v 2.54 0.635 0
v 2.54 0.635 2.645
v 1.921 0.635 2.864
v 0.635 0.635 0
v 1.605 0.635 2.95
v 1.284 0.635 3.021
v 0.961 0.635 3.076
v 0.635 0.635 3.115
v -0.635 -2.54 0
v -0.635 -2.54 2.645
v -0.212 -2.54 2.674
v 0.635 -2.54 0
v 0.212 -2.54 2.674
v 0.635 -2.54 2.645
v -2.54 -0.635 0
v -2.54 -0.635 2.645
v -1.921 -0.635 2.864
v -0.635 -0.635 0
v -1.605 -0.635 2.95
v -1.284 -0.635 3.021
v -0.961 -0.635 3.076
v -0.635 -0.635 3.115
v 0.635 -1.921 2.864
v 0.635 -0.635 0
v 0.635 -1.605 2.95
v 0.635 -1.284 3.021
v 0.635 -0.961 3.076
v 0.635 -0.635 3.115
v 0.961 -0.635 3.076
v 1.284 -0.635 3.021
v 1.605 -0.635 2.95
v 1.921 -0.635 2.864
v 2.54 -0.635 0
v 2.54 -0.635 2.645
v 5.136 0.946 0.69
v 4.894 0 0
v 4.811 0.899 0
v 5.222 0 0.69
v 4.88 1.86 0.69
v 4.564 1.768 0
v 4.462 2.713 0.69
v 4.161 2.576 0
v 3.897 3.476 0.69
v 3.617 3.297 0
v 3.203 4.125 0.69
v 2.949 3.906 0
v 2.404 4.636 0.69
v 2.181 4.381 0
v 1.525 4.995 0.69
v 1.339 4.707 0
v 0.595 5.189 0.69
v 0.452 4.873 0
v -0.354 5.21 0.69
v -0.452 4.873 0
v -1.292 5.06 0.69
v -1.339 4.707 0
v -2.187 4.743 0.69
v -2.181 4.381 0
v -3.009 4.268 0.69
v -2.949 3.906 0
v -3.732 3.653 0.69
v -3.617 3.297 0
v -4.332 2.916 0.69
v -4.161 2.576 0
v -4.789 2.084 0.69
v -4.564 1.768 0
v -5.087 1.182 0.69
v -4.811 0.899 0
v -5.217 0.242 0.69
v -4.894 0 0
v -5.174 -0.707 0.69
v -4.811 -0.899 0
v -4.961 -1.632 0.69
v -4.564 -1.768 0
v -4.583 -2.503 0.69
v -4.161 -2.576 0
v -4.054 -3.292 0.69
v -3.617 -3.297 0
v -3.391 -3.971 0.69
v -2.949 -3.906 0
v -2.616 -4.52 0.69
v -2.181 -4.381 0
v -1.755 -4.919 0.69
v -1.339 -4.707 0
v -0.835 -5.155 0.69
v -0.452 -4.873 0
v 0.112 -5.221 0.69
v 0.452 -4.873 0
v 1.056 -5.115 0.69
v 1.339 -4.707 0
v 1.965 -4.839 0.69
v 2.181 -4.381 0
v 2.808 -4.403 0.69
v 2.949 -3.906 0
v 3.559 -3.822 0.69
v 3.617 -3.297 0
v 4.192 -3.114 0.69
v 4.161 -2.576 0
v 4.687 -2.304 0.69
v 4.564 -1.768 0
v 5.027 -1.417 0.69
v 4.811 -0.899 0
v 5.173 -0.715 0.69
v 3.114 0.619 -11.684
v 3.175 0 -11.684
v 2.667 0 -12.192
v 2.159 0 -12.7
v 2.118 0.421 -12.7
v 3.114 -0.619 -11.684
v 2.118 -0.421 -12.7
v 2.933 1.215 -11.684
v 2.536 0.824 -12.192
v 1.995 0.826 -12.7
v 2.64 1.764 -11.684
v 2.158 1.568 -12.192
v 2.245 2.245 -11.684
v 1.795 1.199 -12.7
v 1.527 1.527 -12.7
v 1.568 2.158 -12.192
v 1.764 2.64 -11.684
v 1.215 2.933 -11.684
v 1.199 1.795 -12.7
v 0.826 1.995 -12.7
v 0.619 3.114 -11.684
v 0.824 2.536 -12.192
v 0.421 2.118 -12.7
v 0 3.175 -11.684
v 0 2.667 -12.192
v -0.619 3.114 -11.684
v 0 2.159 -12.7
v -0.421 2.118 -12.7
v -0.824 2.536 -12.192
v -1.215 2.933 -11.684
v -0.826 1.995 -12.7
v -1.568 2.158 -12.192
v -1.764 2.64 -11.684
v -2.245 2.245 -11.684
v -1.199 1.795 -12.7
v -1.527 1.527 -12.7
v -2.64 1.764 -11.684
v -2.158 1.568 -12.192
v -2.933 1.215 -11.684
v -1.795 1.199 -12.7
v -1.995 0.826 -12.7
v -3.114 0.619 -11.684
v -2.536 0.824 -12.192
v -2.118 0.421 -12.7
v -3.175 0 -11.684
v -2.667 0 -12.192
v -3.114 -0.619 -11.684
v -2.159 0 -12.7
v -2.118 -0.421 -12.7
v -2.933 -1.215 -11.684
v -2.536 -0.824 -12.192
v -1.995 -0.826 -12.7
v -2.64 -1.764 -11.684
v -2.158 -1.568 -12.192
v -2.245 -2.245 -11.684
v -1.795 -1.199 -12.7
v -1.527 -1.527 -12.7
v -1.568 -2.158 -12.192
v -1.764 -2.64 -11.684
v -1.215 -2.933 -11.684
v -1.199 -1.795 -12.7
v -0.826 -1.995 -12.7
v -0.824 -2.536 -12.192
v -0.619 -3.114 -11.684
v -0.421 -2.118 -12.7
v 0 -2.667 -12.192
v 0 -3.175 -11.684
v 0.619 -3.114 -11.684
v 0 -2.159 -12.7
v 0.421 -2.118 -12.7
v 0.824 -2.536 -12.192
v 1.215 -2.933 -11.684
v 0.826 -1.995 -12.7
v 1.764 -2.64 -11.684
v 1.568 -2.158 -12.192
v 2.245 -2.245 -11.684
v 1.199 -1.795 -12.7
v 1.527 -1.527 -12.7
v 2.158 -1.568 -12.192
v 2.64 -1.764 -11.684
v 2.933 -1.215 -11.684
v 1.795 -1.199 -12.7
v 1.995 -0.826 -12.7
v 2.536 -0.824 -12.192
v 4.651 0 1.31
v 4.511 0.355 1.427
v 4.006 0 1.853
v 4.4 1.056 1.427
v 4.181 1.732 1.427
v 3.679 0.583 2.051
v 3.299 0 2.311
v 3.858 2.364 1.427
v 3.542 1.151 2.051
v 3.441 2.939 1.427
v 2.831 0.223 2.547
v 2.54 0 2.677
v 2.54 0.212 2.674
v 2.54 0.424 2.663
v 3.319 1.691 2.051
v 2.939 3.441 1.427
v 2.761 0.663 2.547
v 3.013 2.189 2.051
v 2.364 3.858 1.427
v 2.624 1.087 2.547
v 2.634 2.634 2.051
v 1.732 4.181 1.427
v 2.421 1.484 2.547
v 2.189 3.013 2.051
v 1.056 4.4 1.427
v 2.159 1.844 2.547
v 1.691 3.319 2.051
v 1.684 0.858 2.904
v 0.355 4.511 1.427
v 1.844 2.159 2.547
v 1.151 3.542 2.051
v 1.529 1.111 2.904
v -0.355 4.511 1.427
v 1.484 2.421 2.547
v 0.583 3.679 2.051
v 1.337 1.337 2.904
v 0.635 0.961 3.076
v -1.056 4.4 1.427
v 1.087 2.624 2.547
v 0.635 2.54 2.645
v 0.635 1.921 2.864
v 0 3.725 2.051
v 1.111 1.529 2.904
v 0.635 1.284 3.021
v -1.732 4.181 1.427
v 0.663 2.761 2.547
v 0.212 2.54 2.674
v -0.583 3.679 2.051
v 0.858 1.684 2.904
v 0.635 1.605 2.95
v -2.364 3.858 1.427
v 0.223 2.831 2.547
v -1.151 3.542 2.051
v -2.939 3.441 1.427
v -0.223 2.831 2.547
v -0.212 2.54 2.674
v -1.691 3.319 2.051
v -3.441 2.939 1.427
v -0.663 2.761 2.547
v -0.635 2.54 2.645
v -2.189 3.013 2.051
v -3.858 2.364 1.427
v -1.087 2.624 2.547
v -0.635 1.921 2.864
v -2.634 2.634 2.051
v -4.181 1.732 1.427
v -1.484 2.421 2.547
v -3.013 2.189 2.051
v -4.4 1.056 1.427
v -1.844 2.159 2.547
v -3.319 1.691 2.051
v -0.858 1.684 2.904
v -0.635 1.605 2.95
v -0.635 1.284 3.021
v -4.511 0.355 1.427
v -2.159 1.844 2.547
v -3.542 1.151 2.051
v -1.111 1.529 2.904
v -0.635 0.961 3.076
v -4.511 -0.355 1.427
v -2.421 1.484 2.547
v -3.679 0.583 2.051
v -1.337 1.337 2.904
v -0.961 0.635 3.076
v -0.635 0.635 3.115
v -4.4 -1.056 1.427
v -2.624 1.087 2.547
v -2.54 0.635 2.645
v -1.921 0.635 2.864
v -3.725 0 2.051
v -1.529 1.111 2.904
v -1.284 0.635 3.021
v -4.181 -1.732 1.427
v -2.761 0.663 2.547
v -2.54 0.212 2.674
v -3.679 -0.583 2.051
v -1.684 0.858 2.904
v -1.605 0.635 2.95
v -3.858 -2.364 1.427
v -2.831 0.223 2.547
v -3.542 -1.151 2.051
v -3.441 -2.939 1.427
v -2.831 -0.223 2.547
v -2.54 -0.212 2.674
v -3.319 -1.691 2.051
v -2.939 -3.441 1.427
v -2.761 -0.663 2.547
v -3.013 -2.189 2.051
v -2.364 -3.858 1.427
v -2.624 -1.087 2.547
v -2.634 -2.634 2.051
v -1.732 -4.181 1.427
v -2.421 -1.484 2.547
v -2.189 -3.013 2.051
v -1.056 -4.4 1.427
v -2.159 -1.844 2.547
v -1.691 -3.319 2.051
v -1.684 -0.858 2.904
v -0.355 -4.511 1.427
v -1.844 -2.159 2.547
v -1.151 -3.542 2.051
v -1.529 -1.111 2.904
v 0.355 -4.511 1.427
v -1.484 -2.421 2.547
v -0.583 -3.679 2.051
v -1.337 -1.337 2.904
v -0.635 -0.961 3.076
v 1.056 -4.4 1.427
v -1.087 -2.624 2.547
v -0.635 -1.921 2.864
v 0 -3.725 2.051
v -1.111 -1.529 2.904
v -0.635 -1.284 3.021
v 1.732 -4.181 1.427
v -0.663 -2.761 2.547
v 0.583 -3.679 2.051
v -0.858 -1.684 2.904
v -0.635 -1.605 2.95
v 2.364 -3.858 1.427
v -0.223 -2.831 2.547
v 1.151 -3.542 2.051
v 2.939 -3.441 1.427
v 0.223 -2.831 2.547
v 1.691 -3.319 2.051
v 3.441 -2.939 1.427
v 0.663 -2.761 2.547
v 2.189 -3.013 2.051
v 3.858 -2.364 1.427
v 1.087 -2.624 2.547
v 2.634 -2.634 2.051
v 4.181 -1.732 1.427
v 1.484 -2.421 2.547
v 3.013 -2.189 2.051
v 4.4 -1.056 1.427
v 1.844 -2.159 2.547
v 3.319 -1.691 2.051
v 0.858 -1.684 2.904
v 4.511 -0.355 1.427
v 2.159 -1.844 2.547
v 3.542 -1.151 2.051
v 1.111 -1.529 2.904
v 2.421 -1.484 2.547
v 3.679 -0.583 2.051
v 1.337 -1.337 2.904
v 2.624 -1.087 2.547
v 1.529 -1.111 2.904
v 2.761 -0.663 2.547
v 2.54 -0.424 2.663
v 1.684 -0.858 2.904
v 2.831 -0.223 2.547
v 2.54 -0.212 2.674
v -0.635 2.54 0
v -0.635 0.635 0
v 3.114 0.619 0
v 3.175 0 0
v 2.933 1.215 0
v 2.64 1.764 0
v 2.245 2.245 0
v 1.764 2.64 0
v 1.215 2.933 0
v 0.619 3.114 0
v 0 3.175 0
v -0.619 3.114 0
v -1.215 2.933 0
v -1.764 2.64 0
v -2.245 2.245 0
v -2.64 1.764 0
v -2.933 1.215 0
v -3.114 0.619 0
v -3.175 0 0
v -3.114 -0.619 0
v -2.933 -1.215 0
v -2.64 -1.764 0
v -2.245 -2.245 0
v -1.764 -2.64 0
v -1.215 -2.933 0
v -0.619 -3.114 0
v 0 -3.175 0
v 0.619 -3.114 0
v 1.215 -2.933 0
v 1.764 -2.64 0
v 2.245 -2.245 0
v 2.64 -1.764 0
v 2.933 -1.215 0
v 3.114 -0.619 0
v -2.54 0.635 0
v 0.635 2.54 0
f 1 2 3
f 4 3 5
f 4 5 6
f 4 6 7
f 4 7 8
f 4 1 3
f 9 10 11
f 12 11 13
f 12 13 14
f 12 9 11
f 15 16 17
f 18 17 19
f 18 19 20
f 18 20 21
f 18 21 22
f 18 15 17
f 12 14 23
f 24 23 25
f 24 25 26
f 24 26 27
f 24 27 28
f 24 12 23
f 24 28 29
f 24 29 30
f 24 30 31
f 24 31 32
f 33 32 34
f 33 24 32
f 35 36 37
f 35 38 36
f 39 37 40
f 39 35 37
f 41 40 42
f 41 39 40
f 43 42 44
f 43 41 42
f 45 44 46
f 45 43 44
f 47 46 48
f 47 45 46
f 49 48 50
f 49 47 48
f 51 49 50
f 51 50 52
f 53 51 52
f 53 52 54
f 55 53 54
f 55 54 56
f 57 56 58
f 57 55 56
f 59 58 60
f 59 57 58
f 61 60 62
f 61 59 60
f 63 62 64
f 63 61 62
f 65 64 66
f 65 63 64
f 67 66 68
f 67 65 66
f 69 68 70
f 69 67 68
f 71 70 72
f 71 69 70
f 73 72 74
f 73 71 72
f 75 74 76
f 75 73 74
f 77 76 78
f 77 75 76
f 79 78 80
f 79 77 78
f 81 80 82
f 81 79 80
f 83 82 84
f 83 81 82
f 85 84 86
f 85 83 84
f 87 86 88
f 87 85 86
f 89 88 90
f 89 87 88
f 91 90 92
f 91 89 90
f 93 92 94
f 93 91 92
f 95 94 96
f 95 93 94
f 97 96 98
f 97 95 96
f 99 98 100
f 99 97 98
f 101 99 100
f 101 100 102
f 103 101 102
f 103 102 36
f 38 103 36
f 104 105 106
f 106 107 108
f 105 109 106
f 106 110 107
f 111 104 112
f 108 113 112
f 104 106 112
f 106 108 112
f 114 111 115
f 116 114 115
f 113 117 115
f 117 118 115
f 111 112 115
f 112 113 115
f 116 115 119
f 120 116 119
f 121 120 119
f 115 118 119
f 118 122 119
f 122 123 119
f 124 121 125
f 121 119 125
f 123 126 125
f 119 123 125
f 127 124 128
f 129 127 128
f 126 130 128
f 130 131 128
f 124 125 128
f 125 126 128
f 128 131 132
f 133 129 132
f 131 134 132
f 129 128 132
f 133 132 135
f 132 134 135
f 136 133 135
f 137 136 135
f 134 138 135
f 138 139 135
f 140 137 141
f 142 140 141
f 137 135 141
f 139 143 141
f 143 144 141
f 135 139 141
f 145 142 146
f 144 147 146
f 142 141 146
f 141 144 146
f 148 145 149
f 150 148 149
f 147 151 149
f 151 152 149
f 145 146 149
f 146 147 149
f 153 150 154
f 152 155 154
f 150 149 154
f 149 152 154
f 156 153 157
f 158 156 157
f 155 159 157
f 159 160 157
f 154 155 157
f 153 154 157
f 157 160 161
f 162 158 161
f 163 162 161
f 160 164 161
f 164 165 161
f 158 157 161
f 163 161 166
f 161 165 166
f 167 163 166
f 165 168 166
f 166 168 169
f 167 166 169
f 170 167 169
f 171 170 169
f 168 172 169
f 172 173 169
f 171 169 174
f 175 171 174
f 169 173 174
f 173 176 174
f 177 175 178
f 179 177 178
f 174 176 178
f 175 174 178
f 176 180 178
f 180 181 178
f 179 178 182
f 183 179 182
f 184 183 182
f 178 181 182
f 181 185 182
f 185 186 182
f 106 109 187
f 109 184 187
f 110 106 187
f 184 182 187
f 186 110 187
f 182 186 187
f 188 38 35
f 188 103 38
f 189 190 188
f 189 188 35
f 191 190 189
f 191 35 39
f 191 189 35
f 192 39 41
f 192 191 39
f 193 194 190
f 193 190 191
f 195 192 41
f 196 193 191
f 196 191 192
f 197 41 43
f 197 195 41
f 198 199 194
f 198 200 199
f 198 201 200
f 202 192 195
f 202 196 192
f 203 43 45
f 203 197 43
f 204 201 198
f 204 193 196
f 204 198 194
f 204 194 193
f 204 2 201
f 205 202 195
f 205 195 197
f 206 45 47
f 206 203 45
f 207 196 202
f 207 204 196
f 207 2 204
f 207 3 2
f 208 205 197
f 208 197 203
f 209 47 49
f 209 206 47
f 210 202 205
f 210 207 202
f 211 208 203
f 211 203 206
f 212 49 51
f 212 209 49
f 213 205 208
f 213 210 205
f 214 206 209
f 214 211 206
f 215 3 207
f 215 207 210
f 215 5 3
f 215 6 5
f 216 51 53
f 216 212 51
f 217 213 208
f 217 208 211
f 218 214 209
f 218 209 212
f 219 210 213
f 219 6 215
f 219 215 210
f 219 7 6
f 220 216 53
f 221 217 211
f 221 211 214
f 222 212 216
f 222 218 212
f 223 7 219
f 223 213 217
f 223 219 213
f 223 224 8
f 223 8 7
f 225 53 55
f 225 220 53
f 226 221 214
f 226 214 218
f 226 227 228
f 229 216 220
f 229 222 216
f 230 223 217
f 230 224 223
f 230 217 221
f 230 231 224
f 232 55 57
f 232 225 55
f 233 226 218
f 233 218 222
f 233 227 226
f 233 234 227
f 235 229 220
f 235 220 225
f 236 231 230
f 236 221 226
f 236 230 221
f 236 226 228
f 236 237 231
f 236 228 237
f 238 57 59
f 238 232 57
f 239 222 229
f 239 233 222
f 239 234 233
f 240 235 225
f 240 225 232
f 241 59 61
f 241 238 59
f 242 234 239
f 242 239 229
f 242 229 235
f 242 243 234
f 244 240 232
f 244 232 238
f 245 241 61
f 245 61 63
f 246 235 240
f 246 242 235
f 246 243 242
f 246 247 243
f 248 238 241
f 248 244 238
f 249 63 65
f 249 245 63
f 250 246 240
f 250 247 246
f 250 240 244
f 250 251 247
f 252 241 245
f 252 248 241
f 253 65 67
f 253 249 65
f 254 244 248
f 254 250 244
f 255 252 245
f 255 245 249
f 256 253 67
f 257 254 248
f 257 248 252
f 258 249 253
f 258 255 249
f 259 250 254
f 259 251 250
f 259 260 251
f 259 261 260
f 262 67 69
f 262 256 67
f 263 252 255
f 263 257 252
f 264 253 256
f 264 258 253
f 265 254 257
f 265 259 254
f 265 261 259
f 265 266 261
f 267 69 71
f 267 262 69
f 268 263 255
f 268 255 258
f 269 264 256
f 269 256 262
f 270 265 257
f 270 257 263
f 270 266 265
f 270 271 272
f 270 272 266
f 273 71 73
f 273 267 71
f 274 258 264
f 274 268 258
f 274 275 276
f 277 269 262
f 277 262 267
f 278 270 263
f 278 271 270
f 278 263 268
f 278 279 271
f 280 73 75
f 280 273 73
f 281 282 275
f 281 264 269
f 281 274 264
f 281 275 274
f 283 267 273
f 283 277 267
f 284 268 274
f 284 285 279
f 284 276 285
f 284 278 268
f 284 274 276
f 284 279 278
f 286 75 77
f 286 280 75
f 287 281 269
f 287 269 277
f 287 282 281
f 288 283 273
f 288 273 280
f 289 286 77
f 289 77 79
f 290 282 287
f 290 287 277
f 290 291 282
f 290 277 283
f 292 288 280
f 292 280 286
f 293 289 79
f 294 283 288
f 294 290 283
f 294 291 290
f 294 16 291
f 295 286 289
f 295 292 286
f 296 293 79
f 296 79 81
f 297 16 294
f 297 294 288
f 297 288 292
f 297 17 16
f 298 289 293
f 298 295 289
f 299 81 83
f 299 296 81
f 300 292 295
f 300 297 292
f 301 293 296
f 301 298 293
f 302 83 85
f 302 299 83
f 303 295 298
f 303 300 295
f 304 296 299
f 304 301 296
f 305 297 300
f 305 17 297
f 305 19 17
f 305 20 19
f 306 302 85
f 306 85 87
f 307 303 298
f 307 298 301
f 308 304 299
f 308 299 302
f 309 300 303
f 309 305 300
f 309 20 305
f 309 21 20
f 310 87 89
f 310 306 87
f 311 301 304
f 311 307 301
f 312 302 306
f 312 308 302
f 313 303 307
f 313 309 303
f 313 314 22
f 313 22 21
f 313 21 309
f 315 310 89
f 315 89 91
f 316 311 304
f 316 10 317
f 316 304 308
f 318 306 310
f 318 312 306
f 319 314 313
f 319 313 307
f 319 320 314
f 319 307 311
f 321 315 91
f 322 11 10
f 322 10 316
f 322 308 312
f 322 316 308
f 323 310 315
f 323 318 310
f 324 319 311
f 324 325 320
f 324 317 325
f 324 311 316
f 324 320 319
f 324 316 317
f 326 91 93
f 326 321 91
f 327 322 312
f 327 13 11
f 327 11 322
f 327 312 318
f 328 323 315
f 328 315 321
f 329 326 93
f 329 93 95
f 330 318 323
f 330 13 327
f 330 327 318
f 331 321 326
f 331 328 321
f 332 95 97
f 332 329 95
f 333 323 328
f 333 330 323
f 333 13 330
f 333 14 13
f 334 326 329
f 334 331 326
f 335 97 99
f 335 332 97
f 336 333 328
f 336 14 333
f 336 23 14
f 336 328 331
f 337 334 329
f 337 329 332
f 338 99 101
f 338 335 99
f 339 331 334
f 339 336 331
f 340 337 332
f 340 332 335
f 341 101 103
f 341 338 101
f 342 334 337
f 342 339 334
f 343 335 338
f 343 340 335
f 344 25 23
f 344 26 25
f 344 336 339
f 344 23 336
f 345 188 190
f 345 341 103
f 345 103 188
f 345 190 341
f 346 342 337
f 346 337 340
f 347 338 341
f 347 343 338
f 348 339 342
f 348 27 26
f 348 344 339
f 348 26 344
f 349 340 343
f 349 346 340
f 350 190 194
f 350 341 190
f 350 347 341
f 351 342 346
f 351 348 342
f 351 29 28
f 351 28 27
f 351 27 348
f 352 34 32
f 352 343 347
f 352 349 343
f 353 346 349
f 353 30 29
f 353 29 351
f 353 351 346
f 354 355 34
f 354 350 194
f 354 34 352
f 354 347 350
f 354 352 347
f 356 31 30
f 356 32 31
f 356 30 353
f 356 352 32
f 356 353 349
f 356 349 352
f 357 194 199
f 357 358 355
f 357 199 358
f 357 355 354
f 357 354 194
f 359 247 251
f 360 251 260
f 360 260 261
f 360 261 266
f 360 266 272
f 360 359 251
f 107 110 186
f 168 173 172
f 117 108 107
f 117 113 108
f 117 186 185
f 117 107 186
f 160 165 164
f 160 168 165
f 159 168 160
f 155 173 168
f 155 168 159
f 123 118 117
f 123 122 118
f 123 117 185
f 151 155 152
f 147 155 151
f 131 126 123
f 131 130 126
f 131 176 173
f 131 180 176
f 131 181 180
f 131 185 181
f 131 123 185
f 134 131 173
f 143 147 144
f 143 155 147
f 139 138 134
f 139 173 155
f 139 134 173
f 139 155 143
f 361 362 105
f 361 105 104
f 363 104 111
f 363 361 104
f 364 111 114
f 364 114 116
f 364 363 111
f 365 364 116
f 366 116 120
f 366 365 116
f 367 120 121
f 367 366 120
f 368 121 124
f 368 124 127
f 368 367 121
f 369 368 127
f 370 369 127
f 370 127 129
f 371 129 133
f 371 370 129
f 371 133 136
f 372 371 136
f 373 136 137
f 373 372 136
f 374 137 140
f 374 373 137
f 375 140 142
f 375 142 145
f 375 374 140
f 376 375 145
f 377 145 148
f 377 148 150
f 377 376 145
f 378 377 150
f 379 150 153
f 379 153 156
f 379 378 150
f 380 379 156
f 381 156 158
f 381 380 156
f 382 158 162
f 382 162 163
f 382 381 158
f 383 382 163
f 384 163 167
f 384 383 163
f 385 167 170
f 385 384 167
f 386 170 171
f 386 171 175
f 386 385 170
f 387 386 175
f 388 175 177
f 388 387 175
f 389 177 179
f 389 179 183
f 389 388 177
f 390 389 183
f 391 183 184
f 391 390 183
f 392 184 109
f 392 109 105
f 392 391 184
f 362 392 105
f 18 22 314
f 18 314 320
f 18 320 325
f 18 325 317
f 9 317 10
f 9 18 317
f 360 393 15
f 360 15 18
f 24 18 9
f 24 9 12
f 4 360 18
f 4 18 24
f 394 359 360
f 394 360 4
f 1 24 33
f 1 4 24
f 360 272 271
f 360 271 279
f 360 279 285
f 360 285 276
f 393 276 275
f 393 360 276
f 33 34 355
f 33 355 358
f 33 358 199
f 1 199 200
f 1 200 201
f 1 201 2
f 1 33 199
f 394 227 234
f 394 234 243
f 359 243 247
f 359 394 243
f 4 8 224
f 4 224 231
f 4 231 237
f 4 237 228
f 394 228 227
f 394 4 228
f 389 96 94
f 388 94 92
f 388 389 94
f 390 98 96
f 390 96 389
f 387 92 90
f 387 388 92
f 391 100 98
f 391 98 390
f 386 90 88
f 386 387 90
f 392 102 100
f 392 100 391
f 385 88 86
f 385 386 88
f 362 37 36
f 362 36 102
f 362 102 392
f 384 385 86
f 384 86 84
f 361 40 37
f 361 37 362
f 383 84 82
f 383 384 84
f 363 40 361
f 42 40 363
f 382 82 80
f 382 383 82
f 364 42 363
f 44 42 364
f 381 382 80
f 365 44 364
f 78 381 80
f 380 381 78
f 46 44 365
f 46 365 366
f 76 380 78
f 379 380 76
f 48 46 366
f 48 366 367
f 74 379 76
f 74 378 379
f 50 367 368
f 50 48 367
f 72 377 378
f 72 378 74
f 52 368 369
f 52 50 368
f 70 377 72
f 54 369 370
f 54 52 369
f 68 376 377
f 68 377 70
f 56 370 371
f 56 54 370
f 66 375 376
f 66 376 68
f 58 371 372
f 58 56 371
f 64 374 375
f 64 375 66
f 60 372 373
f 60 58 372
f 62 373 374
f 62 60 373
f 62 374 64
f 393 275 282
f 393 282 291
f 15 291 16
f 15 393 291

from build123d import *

# Parameters (mm, degrees)
F4_DEPTH = 3.176
F5_SIZE  = 1.016


# Not quite as in the source:
# - a fillet or chamfer that OpenCascade refuses, or shapes differently, is made with other operations: its cross-section is extruded or revolved along the edge and cut away or added


with BuildPart() as f1:
    # F0 (on Front) → F1 (revolve)
    with BuildSketch(Plane.XZ):
        with BuildLine():
            Line((3.175, 0), (5.715, 0))
            ThreePointArc((5.715, 0), (3.2688625698, 2.3279526256), (0, 3.175))
            Line((0, 3.175), (0, -12.7))
            Line((0, -12.7), (3.175, -12.7))
            Line((3.175, -12.7), (3.175, 0))
        make_face()
    revolve(axis=Axis((0, 0, -4.7625), (0, 0, 1)))

    # F2: chamfer of 0.762 on 1 edges, made by hand

    # F2_s1 → F2_t2 (revolve, cut)
    with BuildSketch(Plane.XZ):
        with BuildLine():
            Line((4.8809391349, -0.0275238998), (5.2355867217, 0.7179265843))
            Line((5.2355867217, 0.7179265843), (5.2474112325, 0.727541081))
            ThreePointArc((5.2474112325, 0.727541081), (5.4877257432, 0.3678527374), (5.7279396226, 0.0080513208))
            Line((5.7279396226, 0.0080513208), (5.715, -0.01524))
            ThreePointArc((5.715, -0.01524), (5.2979695675, -0.01524), (4.8809391349, -0.0427638998))
            Line((4.8809391349, -0.0427638998), (4.8809391349, -0.0275238998))
        make_face()
    revolve(axis=Axis((0, 0, 0), (0, 0, 1)), mode=Mode.SUBTRACT)

    # F3 (on Top) → F4 (cut, through all)
    with BuildSketch(Plane.XY):
        Polygon((0.635, 2.54), (-0.635, 2.54), (-0.635, 0.635), (-2.54, 0.635), (-2.54, -0.635), (-0.635, -0.635), (-0.635, -2.54), (0.635, -2.54), (0.635, -0.635), (2.54, -0.635), (2.54, 0.635), (0.635, 0.635), align=None)
    extrude(amount=F4_DEPTH, mode=Mode.SUBTRACT)

    # F5
    f5_edges = [f1.edges().sort_by_distance(p)[0] for p in [
        (-3.175, 0, -12.7),
    ]]
    chamfer(f5_edges, length=F5_SIZE)


solid = f1.part
